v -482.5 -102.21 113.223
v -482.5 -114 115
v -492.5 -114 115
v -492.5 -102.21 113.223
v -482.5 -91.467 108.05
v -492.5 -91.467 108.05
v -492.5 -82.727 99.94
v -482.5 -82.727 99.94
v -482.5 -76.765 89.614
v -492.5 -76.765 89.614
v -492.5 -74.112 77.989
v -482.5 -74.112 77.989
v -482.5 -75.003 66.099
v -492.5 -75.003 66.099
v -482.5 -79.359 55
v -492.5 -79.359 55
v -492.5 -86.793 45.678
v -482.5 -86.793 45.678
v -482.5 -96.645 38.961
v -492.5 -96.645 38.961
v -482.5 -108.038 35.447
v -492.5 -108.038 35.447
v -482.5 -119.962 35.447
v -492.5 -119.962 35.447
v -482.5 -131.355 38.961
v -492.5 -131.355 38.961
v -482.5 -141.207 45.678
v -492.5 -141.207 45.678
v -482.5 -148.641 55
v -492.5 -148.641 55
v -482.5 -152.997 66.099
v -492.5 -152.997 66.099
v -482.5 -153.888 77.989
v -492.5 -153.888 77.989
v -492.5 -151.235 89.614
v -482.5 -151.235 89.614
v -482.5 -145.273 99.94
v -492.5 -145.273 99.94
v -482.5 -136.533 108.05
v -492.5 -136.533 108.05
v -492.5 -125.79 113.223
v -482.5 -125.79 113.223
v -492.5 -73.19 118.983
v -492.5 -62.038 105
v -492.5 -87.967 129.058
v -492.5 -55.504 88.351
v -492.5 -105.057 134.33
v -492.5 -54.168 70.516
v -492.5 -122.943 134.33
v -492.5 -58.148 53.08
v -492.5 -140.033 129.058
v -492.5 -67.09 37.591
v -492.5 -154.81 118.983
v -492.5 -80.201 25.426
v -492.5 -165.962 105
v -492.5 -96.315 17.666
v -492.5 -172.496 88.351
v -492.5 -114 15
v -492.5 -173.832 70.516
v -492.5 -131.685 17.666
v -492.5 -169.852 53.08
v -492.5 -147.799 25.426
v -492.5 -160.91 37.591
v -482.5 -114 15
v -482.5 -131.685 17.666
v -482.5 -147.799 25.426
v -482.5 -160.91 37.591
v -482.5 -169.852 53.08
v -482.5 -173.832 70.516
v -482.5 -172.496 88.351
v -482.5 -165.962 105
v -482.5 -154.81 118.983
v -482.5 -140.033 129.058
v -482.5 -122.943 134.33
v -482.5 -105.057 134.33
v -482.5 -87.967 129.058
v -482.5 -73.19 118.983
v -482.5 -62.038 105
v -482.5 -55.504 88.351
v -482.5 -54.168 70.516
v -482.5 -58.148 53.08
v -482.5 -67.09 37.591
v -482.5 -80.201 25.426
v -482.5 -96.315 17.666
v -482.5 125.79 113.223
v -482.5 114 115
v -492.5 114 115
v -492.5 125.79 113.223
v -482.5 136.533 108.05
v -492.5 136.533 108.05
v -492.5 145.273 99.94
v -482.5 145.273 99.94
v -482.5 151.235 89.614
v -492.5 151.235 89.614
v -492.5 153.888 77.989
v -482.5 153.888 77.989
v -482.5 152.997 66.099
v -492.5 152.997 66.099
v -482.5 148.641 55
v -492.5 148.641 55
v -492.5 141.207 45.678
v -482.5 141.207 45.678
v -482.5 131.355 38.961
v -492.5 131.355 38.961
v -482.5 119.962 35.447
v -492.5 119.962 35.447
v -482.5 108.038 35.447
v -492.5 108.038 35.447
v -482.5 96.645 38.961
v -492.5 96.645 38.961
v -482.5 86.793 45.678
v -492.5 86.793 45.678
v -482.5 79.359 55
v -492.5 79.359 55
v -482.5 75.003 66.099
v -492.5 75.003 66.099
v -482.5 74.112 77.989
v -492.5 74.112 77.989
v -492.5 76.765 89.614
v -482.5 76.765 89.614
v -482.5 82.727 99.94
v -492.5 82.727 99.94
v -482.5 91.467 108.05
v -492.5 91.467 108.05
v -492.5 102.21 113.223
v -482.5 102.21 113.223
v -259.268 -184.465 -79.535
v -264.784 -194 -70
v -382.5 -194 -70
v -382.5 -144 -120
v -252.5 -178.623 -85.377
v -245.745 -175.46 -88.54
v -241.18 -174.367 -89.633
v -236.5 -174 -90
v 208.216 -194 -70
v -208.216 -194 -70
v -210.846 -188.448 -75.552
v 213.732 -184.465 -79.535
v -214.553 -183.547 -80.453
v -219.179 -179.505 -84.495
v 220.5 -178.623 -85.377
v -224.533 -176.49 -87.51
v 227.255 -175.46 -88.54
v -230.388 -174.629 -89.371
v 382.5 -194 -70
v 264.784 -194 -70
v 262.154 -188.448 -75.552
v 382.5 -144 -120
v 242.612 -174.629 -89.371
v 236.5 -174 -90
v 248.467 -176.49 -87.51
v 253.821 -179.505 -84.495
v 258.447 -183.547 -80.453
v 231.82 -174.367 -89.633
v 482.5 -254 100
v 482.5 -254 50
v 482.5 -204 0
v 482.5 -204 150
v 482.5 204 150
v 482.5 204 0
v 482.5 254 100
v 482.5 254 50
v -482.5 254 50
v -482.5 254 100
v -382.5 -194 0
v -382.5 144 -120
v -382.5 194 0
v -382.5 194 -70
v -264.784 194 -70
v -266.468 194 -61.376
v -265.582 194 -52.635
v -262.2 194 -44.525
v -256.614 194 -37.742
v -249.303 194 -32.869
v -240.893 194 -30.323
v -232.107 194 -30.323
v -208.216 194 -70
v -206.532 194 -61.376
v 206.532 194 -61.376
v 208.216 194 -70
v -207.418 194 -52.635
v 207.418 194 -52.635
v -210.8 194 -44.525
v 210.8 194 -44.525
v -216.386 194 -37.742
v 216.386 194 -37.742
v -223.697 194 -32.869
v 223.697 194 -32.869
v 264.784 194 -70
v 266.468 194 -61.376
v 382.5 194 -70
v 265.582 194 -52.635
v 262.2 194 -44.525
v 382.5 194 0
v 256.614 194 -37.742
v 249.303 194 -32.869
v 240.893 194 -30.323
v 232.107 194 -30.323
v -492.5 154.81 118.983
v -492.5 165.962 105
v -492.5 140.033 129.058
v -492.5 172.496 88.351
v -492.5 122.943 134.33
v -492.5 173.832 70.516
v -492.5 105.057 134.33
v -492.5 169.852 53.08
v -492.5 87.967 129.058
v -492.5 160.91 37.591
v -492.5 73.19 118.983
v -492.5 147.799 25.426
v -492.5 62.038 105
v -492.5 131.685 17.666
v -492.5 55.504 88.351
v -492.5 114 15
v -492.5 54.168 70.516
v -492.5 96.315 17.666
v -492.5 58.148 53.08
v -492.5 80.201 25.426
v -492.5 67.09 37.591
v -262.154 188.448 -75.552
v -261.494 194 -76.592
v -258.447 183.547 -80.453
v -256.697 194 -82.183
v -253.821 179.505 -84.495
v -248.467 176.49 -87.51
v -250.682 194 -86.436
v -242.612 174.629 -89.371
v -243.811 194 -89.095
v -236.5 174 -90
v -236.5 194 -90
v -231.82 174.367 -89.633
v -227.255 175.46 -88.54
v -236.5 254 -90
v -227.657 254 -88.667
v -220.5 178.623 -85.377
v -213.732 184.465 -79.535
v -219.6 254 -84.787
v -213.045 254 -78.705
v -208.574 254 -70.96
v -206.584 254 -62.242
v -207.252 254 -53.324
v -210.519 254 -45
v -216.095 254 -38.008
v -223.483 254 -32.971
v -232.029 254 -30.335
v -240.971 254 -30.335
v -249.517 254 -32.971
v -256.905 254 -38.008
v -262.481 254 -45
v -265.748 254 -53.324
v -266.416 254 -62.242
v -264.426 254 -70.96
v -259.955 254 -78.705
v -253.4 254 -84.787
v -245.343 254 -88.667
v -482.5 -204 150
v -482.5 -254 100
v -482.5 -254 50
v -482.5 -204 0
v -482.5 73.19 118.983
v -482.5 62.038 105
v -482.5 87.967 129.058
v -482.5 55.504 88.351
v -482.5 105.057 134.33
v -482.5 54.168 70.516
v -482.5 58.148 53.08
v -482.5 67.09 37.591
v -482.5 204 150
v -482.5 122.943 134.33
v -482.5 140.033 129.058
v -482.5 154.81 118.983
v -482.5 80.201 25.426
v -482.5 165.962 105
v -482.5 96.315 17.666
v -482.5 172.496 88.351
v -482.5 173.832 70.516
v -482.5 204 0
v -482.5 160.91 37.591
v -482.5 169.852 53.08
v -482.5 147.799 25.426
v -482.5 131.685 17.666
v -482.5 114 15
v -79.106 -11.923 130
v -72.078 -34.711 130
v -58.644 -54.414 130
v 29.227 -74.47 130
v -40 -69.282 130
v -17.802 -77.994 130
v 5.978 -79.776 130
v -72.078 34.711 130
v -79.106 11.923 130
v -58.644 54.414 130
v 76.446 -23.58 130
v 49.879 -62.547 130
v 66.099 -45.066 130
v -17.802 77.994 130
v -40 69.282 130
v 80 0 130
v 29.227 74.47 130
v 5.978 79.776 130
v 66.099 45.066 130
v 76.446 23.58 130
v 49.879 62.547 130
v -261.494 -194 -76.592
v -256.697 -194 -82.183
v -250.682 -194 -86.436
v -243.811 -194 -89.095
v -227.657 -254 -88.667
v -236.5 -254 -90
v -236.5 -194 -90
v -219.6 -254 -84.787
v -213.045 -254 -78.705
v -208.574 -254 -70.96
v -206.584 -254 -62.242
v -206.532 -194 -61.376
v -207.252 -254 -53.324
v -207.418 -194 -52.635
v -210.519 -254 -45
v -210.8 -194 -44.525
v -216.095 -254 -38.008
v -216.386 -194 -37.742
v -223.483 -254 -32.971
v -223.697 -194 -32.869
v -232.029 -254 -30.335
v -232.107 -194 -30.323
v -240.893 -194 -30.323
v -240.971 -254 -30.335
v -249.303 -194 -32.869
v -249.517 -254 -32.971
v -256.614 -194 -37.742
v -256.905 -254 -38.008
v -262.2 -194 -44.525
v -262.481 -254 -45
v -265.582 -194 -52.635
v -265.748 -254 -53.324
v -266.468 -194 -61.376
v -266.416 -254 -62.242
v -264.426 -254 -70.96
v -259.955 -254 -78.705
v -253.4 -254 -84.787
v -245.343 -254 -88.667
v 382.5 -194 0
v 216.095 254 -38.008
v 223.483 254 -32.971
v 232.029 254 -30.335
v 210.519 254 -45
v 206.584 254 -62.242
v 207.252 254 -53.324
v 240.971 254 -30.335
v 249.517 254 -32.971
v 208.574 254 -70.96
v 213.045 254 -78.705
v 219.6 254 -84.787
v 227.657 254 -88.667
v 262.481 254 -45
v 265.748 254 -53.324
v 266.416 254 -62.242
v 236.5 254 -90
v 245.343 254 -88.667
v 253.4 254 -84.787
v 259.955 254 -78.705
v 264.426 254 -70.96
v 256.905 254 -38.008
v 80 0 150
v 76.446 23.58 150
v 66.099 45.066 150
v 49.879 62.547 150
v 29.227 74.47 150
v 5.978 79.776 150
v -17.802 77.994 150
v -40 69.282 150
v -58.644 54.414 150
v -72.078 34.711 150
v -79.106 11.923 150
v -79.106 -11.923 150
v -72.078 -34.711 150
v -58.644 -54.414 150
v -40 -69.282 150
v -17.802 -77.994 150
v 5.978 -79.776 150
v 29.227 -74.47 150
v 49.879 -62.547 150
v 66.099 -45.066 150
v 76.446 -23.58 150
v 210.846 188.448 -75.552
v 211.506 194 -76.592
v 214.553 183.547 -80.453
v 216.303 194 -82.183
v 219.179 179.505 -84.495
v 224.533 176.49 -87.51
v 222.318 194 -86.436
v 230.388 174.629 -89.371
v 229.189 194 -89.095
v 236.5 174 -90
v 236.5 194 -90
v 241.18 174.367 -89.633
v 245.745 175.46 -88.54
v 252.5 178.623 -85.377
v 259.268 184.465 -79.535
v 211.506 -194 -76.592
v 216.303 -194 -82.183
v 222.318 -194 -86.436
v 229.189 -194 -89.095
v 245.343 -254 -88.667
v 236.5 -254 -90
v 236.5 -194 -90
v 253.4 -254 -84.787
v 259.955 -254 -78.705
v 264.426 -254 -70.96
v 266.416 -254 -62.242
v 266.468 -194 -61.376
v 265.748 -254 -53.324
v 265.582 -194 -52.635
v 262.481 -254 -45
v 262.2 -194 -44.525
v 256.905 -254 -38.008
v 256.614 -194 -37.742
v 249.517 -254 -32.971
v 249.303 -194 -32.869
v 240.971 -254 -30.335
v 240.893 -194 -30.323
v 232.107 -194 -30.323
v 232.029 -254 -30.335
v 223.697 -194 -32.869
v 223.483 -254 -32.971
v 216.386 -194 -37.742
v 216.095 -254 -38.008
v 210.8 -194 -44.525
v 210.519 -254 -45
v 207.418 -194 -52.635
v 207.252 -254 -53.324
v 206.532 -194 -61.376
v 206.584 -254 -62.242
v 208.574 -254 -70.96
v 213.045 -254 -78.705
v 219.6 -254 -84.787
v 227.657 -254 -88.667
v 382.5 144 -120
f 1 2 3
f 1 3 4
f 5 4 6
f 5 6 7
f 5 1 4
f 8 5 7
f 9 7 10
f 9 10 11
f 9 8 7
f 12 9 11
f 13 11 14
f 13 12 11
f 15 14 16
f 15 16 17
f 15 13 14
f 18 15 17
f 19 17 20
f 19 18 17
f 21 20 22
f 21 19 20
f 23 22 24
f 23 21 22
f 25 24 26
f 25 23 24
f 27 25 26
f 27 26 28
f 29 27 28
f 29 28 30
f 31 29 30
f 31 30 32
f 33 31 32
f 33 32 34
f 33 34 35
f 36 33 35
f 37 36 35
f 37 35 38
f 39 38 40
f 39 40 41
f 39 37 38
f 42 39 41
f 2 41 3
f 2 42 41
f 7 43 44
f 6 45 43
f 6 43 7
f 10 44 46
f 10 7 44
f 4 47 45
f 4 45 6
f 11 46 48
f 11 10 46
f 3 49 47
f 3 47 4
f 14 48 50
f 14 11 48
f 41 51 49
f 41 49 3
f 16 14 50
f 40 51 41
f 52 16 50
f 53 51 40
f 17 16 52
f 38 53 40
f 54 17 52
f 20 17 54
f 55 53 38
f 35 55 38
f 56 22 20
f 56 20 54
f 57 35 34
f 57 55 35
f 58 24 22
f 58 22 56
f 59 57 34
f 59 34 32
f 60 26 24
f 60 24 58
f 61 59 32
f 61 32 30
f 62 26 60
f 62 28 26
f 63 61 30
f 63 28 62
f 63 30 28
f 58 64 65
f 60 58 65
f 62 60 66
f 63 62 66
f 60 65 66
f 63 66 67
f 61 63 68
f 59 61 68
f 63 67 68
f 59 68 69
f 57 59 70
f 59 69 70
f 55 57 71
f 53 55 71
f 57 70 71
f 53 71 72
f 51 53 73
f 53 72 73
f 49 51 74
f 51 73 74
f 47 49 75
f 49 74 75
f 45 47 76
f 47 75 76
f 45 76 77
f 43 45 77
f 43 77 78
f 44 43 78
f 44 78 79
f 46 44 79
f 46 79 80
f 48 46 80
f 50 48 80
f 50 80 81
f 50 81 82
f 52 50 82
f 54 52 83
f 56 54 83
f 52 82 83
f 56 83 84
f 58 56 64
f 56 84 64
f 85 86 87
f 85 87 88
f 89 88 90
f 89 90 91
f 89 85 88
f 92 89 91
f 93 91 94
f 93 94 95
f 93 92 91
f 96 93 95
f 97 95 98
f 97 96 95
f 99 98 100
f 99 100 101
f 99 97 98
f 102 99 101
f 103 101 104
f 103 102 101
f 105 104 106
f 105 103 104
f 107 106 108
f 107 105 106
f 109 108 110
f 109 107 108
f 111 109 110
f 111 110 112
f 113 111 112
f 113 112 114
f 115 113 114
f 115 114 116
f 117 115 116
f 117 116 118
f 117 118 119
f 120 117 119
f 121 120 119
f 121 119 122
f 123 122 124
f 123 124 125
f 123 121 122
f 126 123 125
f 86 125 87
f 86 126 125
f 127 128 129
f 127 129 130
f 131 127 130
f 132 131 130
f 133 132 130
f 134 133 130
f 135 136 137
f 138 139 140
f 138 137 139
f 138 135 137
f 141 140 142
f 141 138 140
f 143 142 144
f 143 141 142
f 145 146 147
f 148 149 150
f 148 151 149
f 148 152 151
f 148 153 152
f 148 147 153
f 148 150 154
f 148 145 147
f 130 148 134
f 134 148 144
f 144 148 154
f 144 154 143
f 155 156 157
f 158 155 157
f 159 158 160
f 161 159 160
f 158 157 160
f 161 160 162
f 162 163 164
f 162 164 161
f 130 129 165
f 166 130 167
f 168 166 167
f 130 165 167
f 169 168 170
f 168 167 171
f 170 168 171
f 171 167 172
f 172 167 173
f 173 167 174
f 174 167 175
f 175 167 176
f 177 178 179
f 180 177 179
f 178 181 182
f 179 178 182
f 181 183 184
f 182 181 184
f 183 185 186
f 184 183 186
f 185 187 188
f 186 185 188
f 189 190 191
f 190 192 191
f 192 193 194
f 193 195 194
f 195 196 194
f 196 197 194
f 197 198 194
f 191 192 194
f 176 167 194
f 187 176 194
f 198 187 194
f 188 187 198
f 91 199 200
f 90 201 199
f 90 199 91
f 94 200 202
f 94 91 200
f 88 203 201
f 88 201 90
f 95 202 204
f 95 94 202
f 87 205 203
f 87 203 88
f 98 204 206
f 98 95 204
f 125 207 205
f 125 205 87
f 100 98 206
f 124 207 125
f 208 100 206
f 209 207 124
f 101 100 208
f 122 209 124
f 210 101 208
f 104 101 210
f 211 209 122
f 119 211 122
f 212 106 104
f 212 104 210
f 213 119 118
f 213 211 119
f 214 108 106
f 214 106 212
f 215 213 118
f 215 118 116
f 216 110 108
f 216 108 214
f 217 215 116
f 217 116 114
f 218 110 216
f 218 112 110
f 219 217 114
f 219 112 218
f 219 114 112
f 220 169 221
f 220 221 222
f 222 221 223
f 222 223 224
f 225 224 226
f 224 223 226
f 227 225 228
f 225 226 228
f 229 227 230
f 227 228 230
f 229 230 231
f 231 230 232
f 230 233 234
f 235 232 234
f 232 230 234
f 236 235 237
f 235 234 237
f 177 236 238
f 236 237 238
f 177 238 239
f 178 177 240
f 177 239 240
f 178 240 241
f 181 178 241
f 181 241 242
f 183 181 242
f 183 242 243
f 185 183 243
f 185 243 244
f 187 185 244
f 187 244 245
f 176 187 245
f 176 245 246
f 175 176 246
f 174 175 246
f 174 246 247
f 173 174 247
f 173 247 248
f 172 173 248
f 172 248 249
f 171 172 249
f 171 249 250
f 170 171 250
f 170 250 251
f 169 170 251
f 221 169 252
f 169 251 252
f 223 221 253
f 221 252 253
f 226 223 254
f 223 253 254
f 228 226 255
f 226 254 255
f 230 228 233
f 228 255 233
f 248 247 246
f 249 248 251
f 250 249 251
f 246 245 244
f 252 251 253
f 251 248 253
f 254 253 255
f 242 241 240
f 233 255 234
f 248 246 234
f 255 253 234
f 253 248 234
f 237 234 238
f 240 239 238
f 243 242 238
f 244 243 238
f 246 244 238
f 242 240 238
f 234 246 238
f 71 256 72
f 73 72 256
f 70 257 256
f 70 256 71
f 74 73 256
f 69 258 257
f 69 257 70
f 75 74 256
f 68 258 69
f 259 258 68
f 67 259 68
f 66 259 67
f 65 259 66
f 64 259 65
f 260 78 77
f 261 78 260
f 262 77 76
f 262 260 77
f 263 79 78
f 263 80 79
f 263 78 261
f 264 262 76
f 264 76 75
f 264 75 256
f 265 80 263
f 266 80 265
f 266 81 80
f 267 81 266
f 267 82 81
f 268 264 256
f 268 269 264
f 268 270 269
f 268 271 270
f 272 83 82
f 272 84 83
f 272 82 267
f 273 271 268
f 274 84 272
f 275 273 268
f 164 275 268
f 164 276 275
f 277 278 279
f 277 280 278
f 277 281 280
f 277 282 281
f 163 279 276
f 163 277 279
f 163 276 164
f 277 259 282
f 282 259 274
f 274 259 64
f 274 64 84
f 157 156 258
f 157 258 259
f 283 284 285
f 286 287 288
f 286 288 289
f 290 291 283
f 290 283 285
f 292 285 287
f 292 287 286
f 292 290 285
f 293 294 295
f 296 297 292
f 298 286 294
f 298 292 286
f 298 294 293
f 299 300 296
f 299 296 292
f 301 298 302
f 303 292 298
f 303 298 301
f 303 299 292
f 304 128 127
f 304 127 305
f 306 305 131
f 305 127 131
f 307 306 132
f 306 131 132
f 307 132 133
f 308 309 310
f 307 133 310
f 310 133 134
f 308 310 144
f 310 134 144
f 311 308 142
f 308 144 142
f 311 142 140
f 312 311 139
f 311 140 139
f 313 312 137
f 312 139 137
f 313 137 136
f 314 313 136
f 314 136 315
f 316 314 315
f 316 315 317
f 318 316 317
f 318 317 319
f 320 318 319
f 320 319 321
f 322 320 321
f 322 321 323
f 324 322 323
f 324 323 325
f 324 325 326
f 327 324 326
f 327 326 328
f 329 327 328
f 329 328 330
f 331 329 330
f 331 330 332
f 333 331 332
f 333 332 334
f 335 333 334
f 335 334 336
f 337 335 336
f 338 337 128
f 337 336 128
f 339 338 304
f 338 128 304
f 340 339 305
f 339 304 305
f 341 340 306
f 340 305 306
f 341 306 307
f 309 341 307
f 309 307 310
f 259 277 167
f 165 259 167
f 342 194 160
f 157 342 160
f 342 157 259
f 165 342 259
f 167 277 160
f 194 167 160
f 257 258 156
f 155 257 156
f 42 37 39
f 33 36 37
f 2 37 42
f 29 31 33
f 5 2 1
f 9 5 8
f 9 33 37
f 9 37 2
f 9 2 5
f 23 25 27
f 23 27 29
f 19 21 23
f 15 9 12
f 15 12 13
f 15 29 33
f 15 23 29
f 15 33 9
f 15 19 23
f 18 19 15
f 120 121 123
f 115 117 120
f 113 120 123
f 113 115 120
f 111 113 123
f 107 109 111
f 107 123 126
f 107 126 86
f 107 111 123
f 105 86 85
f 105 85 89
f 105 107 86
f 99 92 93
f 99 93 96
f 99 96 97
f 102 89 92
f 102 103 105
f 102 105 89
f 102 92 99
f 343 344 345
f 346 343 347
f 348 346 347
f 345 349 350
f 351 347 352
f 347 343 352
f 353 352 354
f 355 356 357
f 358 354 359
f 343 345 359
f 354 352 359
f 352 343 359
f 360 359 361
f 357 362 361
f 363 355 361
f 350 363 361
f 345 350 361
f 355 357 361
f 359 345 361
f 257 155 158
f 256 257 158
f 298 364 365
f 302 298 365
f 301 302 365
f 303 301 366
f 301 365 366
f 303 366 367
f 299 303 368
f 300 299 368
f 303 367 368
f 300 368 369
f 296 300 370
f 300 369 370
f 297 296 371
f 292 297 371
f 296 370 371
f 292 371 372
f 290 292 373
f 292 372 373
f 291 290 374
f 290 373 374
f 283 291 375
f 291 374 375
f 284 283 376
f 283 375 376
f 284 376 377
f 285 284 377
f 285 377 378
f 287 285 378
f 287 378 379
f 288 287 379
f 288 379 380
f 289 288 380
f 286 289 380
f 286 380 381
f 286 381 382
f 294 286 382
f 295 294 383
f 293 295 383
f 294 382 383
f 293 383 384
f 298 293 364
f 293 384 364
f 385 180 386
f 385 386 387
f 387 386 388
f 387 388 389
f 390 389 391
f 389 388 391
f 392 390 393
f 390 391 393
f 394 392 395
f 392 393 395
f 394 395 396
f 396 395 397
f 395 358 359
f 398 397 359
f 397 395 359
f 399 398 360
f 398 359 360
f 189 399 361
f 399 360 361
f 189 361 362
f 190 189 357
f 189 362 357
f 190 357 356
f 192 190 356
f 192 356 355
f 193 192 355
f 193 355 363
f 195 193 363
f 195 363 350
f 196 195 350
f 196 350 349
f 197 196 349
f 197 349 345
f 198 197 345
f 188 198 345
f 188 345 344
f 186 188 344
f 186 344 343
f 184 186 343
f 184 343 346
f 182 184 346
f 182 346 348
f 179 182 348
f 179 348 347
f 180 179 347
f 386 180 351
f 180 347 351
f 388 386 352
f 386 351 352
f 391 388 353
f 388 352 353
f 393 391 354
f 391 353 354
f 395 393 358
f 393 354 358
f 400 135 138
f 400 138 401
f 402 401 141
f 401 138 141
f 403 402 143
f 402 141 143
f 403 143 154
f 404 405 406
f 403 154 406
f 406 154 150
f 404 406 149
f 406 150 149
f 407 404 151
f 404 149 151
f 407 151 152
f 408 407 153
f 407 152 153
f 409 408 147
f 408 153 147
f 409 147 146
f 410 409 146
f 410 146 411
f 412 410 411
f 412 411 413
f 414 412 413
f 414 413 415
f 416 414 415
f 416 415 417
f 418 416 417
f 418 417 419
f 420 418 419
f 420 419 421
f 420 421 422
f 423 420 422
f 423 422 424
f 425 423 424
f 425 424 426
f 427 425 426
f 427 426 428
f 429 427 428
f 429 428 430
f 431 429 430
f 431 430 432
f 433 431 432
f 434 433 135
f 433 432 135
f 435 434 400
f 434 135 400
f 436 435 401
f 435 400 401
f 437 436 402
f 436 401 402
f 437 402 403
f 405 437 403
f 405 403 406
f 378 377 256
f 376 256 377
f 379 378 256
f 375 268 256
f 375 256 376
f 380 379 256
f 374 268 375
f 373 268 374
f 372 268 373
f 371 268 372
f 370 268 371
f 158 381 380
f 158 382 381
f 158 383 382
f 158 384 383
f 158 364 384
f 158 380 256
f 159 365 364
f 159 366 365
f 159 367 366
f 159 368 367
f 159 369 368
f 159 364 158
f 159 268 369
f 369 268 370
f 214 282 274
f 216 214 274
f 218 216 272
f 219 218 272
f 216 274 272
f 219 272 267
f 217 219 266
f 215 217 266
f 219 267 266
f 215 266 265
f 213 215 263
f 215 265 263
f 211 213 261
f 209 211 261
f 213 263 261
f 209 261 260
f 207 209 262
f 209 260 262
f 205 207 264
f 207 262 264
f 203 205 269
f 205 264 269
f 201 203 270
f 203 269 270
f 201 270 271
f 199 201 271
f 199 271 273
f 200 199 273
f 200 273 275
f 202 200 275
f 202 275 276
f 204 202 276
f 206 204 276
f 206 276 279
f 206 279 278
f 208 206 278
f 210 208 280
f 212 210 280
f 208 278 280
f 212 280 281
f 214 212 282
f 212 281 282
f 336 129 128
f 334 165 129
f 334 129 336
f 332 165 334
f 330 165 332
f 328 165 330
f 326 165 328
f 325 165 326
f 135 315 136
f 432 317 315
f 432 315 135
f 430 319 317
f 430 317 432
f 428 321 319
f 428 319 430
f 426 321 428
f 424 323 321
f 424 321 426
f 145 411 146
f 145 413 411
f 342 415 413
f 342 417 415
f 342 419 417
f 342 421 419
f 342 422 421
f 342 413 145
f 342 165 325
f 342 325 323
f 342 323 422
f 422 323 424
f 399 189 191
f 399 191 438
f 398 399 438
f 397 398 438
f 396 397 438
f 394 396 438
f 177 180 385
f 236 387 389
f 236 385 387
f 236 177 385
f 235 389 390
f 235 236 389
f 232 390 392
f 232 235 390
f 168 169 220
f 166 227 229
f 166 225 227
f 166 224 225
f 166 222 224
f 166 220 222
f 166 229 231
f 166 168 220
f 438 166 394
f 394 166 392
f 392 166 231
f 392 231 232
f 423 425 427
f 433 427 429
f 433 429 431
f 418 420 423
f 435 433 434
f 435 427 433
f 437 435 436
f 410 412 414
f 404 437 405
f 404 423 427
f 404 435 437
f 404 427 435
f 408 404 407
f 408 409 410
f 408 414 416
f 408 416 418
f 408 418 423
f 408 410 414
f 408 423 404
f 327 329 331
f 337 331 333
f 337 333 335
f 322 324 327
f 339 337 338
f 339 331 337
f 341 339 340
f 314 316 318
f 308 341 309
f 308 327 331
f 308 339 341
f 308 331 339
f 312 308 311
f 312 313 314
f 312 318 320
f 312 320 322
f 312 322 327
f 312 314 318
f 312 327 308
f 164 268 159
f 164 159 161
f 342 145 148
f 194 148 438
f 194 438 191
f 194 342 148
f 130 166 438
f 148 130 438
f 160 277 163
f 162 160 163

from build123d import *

# Parameters (mm, degrees)
SKETCH1_W            = 965
SKETCH1_H            = 508
BOSS_EXTRUDE1_DEPTH  = 150
SKETCH2_W            = 765
SKETCH2_H            = 388
BOSS_EXTRUDE2_DEPTH  = 120
SKETCH3_R            = 30
BOSS_EXTRUDE3_DEPTH  = 60
LPATTERN2_COUNT      = 2
LPATTERN2_PITCH      = 448
LPATTERN2_COUNT_DIR2 = 2
LPATTERN2_PITCH_DIR2 = 473
CHAMFER1_SIZE        = 50
SKETCH4_R            = 60
SKETCH4_R_2          = 40
BOSS_EXTRUDE4_DEPTH  = 10
SKETCH5_R            = 80
CUT_EXTRUDE1_DEPTH   = 20


with BuildPart() as part:
    # Sketch1 → Boss-Extrude1 (new body)
    with BuildSketch(Plane.XY):
        Rectangle(SKETCH1_W, SKETCH1_H)
    extrude(amount=BOSS_EXTRUDE1_DEPTH)


with BuildPart() as body_2:
    # Sketch2 → Boss-Extrude2 (new body)
    with BuildSketch(Plane.XY):
        Rectangle(SKETCH2_W, SKETCH2_H)
    extrude(amount=-BOSS_EXTRUDE2_DEPTH)


with BuildPart() as body_3:
    # Sketch3 → Boss-Extrude3 (new body)
    with BuildSketch(Plane.XZ.offset(194)):
        with Locations(Location((236.5, -60, 0), (0, 0, 270))):
            Circle(SKETCH3_R)
    boss_extrude3 = extrude(amount=BOSS_EXTRUDE3_DEPTH)


with BuildPart() as lpattern2_1:
    # LPattern2: pattern copy
    add(boss_extrude3.moved(Location(Vector(0, 1, 0) * (0 * LPATTERN2_PITCH) + Vector(-1, 0, 0) * (1 * LPATTERN2_PITCH_DIR2))))


with BuildPart() as lpattern2_2:
    # LPattern2: pattern copy
    add(boss_extrude3.moved(Location(Vector(0, 1, 0) * (1 * LPATTERN2_PITCH) + Vector(-1, 0, 0) * (0 * LPATTERN2_PITCH_DIR2))))


with BuildPart() as lpattern2_3:
    # LPattern2: pattern copy
    add(boss_extrude3.moved(Location(Vector(0, 1, 0) * (1 * LPATTERN2_PITCH) + Vector(-1, 0, 0) * (1 * LPATTERN2_PITCH_DIR2))))


with BuildPart() as part_1:
    add(part.part)

    # Combine1: union body 2
    add(body_2.part)

    # Combine4: union body 3, LPattern2_1
    add(body_3.part)
    add(lpattern2_1.part)


with BuildPart() as lpattern2_2_1:
    add(lpattern2_2.part)

    # Combine5: union LPattern2_3, part
    add(lpattern2_3.part)
    add(part_1.part)

    # Chamfer1
    # the kernel refuses this chamfer: 50 mm, written as the material it takes off along each edge
    with BuildSketch(Plane(origin=(611.084149398, -254, 0), x_dir=(0, -0.027495876610586594, 0.9996219169112966), z_dir=(-1, 0, 0)), Plane(origin=(-611.084149398, 254, 150), x_dir=(0, -0.9996219169112966, 0.027495876610586587), z_dir=(1, 0, 0))) as chamfer1_piece_1:
        Polygon((CHAMFER1_SIZE * 0.999621916911, CHAMFER1_SIZE * 0.0274958766106), (-CHAMFER1_SIZE * 0.0274958766106, CHAMFER1_SIZE * 0.999621916911), (0, 0), align=None)
    extrude(amount=1222.168298797, mode=Mode.SUBTRACT)
    with BuildSketch(Plane(origin=(-611.084149398, 254, 0), x_dir=(0, -0.9996219169112966, -0.02749587661058636), z_dir=(1, 0, 0)), Plane(origin=(611.084149398, -254, 150), x_dir=(0, -0.027495876610586594, -0.9996219169112966), z_dir=(-1, 0, 0))) as chamfer1_piece_2:
        Polygon((CHAMFER1_SIZE * 0.999621916911, -CHAMFER1_SIZE * 0.0274958766106), (-CHAMFER1_SIZE * 0.0274958766106, -CHAMFER1_SIZE * 0.999621916911), (0, 0), align=None)
    extrude(amount=1222.168298797, mode=Mode.SUBTRACT)
    with BuildSketch(Plane(origin=(-511.084149398, 194, -120), x_dir=(0, 0.027495876610586594, 0.9996219169112966), z_dir=(1, 0, 0))) as chamfer1_piece_3_section:
        Polygon((CHAMFER1_SIZE * 0.999621916911, CHAMFER1_SIZE * 0.0274958766106), (-CHAMFER1_SIZE * 0.0274958766106, CHAMFER1_SIZE * 0.999621916911), (0, 0), align=None)
    chamfer1_piece_3 = extrude(amount=1022.168298797, mode=Mode.PRIVATE)
    chamfer1_piece_3 = chamfer1_piece_3 - Plane(origin=(-236.5, 177.365883925, -60), x_dir=(0, 0, -1), z_dir=(0, 1, 0)) * Cylinder(30, 2245, mode=Mode.PRIVATE)
    chamfer1_piece_3 = chamfer1_piece_3 - Plane(origin=(236.5, 177.365883925, -60), x_dir=(0, 0, -1), z_dir=(0, 1, 0)) * Cylinder(30, 2245, mode=Mode.PRIVATE)
    add(chamfer1_piece_3, mode=Mode.SUBTRACT)
    with BuildSketch(Plane(origin=(511.084149398, -194, -120), x_dir=(0, -0.027495876610586594, 0.9996219169112966), z_dir=(-1, 0, 0))) as chamfer1_piece_4_section:
        Polygon((CHAMFER1_SIZE * 0.999621916911, CHAMFER1_SIZE * 0.0274958766106), (-CHAMFER1_SIZE * 0.0274958766106, CHAMFER1_SIZE * 0.999621916911), (0, 0), align=None)
    chamfer1_piece_4 = extrude(amount=1022.168298797, mode=Mode.PRIVATE)
    chamfer1_piece_4 = chamfer1_piece_4 - Plane(origin=(236.5, -177.365883925, -60), x_dir=(0, 0, -1), z_dir=(0, 1, 0)) * Cylinder(30, 2245, mode=Mode.PRIVATE)
    chamfer1_piece_4 = chamfer1_piece_4 - Plane(origin=(-236.5, -177.365883925, -60), x_dir=(0, 0, -1), z_dir=(0, 1, 0)) * Cylinder(30, 2245, mode=Mode.PRIVATE)
    add(chamfer1_piece_4, mode=Mode.SUBTRACT)

    # Sketch4 → Boss-Extrude4 (add)
    # profile 1 of 2: a face of its own
    with BuildSketch(Plane.ZY.offset(482.5)):
        with Locations(Location((75, 114, 0), (0, 0, 180))):
            Circle(SKETCH4_R)
        with Locations((75, 114)):
            Circle(SKETCH4_R_2, mode=Mode.SUBTRACT)
    # profile 2 of 2: a face of its own
    with BuildSketch(Plane.ZY.offset(482.5)):
        with Locations(Location((75, -114, 0), (0, 0, 180))):
            Circle(SKETCH4_R)
        with Locations((75, -114)):
            Circle(SKETCH4_R_2, mode=Mode.SUBTRACT)
    extrude(amount=BOSS_EXTRUDE4_DEPTH)

    # Sketch5 → Cut-Extrude1 (cut)
    with BuildSketch(Plane.XY.offset(150)):
        Circle(SKETCH5_R)
    extrude(amount=-CUT_EXTRUDE1_DEPTH, mode=Mode.SUBTRACT)


solid = lpattern2_2_1.part
